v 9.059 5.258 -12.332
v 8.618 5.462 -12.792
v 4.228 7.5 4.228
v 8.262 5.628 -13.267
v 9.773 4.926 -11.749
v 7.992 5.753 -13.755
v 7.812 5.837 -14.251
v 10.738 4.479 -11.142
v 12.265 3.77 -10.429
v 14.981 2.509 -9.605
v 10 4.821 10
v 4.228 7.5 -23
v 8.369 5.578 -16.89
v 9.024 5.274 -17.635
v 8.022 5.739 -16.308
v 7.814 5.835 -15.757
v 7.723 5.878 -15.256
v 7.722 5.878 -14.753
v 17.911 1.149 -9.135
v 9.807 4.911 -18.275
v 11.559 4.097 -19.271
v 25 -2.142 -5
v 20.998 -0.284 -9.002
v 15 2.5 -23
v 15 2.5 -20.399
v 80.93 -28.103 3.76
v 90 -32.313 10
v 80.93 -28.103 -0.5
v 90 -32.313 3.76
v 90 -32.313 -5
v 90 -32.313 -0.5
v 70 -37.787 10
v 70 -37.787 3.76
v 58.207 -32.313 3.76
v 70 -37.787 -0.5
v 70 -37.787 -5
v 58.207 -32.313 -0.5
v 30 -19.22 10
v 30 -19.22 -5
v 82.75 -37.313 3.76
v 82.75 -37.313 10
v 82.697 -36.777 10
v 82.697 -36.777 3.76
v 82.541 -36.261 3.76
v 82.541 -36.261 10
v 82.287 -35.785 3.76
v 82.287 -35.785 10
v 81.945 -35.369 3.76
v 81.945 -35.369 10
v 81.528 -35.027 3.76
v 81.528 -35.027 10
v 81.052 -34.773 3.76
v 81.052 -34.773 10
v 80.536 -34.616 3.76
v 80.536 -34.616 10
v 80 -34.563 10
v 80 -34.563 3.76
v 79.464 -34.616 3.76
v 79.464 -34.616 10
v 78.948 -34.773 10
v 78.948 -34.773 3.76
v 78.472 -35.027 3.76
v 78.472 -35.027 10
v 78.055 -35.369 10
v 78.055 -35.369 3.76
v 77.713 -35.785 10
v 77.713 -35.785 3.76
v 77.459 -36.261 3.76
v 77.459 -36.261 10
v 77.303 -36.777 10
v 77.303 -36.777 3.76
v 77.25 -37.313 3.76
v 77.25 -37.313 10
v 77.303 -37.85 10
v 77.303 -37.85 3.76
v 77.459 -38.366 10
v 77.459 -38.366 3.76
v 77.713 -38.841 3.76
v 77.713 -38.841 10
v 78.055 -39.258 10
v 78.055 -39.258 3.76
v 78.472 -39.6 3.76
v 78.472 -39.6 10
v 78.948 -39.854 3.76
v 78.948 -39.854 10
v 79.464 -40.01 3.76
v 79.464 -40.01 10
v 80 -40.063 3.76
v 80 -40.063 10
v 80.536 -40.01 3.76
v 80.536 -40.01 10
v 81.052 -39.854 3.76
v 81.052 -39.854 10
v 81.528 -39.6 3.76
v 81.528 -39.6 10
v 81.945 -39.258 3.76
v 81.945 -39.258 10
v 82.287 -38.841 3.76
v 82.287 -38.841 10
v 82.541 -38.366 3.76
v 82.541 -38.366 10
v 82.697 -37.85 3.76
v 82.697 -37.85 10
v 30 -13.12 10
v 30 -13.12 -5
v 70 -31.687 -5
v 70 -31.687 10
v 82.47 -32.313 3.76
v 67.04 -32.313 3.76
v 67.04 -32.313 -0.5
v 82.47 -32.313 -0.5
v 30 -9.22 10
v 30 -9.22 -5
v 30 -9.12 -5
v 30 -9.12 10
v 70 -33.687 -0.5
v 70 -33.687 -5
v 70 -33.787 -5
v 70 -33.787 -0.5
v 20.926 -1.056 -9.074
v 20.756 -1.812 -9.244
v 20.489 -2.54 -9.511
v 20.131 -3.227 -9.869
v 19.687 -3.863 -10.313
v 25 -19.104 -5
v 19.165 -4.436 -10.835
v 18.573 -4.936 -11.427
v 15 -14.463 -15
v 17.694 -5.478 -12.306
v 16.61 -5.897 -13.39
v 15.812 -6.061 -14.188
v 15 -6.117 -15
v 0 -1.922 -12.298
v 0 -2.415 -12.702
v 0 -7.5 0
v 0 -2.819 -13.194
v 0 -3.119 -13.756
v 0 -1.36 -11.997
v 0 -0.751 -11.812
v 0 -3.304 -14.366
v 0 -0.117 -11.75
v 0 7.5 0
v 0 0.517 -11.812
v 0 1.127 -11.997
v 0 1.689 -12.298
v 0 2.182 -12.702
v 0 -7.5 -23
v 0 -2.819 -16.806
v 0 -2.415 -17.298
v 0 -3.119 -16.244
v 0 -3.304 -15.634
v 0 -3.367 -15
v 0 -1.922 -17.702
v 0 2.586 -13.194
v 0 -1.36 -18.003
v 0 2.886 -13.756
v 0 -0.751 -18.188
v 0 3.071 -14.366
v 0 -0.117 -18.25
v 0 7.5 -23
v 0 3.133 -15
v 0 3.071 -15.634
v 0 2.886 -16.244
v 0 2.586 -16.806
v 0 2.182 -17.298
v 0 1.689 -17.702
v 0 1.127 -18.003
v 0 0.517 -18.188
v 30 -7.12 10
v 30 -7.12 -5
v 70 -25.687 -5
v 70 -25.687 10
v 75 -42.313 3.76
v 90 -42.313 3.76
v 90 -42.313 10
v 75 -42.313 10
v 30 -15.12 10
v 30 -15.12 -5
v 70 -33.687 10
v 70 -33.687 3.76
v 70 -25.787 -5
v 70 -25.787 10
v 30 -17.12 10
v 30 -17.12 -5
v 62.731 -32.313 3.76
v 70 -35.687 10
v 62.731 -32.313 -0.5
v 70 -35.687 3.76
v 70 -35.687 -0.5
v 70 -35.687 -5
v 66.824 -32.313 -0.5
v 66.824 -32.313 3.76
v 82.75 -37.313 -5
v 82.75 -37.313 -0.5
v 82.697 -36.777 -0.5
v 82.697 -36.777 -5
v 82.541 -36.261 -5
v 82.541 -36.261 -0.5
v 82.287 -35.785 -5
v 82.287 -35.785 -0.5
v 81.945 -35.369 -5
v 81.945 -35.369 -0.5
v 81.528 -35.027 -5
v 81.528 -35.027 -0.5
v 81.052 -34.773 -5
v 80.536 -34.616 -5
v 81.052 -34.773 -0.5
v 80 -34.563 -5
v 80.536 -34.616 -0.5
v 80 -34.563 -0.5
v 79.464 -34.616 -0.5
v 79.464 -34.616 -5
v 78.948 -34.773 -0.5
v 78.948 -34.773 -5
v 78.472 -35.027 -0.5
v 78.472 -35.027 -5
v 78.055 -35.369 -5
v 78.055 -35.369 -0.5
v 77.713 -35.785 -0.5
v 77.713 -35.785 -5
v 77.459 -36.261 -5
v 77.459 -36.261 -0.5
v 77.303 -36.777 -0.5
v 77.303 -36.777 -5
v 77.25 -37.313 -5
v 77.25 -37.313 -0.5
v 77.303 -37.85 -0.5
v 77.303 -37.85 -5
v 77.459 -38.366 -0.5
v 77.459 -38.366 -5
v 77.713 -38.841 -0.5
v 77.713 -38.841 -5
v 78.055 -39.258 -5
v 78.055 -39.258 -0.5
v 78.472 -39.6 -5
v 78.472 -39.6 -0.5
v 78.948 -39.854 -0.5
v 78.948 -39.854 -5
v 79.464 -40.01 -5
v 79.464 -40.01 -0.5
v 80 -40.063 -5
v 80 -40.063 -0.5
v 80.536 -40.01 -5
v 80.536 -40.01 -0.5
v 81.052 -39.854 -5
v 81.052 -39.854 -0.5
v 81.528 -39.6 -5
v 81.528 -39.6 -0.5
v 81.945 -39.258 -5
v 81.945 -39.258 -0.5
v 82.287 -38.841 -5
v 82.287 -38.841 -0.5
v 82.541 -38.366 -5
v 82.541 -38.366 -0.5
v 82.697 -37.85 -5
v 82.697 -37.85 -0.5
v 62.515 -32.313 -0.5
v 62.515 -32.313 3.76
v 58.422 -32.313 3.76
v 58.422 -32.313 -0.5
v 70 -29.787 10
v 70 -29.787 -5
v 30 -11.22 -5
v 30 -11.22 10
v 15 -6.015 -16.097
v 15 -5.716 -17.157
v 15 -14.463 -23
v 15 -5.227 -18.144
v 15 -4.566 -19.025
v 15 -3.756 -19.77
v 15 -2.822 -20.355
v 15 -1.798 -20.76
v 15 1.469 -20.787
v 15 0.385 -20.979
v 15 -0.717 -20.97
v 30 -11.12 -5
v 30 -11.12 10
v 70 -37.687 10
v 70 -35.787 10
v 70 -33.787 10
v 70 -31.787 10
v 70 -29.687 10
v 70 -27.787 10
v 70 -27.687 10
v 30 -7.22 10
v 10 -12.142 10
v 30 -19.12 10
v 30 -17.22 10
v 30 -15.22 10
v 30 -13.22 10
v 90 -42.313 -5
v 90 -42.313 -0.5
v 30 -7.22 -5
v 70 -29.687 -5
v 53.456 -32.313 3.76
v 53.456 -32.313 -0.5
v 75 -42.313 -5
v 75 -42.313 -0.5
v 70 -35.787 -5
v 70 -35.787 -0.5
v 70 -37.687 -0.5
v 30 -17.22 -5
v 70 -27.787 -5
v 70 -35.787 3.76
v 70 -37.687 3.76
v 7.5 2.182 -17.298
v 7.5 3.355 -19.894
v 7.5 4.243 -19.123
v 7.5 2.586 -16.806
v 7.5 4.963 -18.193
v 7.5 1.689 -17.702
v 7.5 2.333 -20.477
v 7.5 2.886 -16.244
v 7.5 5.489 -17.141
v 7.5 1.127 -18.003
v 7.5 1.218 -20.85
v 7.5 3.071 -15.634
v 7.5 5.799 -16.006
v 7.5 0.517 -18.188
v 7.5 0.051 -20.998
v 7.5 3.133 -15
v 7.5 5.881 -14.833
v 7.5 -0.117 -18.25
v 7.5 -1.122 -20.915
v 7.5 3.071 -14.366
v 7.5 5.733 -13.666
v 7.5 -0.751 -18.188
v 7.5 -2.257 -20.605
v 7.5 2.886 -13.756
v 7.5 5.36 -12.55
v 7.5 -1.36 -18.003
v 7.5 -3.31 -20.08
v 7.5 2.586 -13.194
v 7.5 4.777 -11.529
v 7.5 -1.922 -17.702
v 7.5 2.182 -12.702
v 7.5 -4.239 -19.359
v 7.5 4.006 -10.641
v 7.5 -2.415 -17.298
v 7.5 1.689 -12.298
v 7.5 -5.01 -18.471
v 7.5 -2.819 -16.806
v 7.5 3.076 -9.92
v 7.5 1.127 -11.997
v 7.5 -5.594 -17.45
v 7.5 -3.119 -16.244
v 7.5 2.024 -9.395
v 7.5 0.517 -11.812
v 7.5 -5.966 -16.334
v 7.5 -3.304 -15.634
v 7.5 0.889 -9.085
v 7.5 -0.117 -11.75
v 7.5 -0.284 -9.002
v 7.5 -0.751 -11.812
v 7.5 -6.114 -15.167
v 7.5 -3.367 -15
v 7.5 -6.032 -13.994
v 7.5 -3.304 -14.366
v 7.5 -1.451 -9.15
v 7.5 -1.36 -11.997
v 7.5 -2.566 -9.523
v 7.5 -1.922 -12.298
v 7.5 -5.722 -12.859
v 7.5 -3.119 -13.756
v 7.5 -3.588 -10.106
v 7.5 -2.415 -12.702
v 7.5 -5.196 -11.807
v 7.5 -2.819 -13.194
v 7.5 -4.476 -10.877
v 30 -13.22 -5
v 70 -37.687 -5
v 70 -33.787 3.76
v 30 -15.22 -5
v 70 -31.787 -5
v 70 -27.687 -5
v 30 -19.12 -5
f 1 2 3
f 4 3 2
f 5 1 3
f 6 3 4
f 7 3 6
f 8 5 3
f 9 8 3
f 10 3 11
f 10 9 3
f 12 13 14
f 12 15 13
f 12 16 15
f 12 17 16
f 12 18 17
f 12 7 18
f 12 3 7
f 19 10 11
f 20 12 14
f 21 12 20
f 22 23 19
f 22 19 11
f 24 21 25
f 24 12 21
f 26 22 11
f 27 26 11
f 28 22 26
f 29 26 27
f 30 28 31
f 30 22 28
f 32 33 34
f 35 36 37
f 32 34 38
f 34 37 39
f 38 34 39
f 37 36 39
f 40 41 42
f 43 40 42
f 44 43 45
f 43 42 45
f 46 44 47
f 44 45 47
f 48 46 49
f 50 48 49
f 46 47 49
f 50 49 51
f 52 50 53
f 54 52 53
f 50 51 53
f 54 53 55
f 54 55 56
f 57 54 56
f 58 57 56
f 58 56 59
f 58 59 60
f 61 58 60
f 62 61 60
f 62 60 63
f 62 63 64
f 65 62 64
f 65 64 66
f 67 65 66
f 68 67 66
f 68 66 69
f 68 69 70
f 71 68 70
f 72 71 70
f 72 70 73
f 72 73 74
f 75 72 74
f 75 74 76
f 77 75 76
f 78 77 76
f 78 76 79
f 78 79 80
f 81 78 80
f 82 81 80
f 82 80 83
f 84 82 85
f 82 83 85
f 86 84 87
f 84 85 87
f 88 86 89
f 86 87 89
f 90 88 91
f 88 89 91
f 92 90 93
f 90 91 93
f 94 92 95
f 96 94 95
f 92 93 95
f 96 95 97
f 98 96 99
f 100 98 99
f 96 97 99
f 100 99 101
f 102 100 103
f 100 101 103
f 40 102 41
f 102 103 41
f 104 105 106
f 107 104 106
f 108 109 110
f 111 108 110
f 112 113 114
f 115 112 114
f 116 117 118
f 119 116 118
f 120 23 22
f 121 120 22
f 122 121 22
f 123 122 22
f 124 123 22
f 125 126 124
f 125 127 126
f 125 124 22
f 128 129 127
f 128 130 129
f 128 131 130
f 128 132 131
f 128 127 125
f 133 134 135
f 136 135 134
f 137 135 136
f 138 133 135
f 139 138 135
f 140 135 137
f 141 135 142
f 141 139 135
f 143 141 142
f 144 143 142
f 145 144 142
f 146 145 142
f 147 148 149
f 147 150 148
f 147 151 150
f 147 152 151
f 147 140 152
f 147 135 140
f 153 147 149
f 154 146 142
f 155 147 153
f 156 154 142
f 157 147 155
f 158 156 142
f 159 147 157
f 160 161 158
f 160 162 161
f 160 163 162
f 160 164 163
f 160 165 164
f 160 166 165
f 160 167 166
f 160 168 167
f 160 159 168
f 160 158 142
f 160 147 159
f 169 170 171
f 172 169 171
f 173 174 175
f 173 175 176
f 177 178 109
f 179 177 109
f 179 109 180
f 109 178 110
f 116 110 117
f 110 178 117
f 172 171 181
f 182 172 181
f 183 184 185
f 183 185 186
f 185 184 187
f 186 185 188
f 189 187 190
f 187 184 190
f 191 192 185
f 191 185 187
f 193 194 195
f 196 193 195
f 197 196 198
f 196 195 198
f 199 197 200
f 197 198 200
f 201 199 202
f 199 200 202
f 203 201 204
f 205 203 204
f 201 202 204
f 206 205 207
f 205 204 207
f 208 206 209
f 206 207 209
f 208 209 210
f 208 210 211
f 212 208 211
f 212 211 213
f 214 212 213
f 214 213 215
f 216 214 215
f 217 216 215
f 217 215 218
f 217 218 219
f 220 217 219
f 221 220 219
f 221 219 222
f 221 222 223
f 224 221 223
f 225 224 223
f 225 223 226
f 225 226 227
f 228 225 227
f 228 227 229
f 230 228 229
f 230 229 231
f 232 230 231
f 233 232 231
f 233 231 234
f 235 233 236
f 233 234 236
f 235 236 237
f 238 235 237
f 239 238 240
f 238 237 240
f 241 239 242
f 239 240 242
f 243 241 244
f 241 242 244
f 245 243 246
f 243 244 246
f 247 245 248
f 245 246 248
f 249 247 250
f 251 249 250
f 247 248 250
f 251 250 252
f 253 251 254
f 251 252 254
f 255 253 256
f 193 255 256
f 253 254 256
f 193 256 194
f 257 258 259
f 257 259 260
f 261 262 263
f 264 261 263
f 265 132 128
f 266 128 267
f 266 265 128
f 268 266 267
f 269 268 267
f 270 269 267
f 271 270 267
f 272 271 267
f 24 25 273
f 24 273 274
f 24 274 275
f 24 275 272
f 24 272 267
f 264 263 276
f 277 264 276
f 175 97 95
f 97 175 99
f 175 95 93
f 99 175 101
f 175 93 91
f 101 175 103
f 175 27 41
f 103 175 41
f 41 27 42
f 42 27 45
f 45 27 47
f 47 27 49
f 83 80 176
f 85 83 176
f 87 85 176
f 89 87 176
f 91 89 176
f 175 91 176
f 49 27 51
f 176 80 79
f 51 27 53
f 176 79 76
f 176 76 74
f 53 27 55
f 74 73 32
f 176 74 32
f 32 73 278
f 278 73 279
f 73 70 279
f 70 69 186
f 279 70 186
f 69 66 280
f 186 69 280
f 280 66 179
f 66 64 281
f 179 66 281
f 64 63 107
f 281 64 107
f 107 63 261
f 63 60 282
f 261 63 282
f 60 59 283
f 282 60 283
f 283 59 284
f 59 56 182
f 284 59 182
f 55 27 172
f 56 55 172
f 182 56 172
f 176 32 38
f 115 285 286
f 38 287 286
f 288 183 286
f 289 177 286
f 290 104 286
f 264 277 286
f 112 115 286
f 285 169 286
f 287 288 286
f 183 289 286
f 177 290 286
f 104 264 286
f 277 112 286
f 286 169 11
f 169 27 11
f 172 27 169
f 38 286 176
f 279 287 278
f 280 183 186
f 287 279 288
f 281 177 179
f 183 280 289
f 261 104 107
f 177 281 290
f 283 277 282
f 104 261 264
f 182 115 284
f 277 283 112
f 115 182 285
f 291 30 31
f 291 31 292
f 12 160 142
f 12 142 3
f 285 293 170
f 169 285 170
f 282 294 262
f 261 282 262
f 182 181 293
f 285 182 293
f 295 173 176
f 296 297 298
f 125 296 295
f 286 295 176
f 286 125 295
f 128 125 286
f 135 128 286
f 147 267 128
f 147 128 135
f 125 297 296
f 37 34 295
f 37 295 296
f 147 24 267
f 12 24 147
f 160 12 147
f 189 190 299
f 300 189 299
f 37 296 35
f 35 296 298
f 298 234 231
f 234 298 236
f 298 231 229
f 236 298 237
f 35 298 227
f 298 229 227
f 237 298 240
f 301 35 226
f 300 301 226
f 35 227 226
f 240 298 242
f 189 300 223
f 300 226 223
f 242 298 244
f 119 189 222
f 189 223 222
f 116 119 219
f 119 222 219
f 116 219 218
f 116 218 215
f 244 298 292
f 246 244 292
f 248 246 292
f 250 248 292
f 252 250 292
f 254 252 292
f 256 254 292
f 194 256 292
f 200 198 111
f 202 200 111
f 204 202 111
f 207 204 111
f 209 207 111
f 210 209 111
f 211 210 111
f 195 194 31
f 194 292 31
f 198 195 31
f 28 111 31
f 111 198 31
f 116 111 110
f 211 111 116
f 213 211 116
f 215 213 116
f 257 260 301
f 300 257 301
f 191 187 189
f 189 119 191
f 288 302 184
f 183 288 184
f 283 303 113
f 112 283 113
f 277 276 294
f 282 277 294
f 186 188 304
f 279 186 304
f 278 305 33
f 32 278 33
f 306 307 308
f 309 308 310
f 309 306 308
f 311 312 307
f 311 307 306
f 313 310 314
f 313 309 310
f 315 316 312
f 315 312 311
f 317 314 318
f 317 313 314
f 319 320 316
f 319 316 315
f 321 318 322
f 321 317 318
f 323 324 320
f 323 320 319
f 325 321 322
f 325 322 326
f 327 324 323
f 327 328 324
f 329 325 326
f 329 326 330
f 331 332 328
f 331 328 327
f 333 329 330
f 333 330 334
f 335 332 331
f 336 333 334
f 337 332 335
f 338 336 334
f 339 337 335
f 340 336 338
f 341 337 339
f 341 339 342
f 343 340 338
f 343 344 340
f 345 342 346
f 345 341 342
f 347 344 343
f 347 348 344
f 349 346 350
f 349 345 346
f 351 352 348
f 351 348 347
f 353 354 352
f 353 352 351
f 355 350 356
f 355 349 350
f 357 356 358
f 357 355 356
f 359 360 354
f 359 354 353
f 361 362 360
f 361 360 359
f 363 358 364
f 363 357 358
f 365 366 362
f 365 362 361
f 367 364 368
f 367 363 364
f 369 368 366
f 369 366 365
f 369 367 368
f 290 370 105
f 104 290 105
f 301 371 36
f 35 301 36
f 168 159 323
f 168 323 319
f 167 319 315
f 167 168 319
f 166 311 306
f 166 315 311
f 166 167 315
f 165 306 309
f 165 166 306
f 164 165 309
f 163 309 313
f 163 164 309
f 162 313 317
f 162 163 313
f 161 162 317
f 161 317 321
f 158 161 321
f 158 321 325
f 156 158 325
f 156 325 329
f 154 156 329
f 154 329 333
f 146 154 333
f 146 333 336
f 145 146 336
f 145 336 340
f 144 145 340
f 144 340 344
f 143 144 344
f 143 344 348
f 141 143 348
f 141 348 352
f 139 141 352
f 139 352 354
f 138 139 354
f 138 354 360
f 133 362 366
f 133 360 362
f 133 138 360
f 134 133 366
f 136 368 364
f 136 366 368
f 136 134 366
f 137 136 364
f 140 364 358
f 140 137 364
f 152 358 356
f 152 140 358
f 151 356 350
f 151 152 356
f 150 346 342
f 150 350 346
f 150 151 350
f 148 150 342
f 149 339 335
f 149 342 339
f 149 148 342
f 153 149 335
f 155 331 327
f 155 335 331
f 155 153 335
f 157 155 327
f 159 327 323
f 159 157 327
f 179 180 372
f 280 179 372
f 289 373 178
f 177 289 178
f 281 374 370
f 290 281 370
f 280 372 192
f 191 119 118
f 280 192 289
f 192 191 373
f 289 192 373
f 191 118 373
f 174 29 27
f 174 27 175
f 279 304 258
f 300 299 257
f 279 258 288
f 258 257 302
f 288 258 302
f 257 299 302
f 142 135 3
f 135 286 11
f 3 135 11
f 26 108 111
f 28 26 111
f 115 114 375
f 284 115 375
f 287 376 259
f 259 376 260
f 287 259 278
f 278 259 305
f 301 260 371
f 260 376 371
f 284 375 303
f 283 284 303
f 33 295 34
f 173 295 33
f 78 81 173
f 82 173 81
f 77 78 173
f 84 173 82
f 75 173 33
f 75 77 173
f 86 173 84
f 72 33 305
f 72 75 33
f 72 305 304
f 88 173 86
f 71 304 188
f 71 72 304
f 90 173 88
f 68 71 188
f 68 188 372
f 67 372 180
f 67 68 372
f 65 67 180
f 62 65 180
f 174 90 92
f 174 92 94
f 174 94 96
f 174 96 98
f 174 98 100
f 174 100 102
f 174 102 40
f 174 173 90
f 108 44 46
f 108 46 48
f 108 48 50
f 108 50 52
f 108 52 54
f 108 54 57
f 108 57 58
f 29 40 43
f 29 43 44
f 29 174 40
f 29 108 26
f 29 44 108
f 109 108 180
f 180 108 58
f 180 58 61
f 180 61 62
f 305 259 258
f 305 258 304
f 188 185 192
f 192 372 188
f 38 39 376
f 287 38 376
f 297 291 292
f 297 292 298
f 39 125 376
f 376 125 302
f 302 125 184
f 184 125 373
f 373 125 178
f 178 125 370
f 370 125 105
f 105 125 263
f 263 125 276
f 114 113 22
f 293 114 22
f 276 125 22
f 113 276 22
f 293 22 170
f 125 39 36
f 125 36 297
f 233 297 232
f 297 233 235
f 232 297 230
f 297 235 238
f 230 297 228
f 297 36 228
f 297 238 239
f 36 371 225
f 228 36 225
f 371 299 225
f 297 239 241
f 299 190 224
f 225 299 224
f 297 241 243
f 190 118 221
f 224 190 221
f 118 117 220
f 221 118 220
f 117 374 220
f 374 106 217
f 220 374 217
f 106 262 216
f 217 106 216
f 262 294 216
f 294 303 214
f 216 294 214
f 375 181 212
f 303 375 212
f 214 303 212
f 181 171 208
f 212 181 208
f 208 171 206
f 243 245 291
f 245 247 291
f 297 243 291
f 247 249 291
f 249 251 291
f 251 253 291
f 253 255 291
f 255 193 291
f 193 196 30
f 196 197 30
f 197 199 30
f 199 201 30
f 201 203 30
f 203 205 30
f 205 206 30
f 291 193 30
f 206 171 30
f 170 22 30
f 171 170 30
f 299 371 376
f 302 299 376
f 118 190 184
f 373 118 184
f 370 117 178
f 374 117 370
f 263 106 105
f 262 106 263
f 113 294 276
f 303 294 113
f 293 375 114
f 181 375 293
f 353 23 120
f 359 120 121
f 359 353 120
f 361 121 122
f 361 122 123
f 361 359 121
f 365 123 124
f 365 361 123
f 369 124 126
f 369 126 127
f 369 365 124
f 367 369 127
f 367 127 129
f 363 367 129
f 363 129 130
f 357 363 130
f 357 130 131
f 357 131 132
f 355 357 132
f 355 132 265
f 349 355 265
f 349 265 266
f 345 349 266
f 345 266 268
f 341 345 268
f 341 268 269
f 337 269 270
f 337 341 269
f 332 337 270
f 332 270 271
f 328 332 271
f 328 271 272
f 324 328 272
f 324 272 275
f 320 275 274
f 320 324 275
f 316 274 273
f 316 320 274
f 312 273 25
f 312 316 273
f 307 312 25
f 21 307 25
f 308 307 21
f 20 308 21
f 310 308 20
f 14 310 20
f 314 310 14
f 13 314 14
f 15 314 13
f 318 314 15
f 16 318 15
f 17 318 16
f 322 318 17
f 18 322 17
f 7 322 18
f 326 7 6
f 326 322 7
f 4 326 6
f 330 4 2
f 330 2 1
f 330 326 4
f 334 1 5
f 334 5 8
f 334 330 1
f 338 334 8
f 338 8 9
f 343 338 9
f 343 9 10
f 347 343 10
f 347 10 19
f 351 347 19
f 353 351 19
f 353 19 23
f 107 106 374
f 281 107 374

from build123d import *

# Parameters (mm, degrees)
BOSS_EXTRUDE1_DEPTH      = 10
BOSS_EXTRUDE1_DEPTH_BACK = 23
SKETCH2_W                = 75
SKETCH2_H                = 18
CUT_EXTRUDE1_DEPTH       = 106.405673062
SKETCH3_W                = 4.26
SKETCH3_H                = 10
CUT_EXTRUDE2_DEPTH       = 103.075500294
CHAMFER1_SIZE            = 10
SKETCH4_R                = 2.75
CUT_EXTRUDE3_DEPTH       = 105.782669179
CUT_EXTRUDE4_DEPTH       = 90.13140726
CUT_EXTRUDE4_DEPTH_BACK  = 90.13140726
SKETCH5_R                = 3.25
SKETCH6_R                = 6
CUT_EXTRUDE5_DEPTH       = 96.528308685
CHAMFER2_SIZE            = 10
CHAMFER2_SIZE2           = 7.529686928
CUT_EXTRUDE6_DEPTH       = 102.066353255


with BuildPart() as part:
    # Sketch1 → Boss-Extrude1 (new, two sides: drawn at the far end of the back side and taken through both)
    with BuildSketch(Plane.XY.offset(-BOSS_EXTRUDE1_DEPTH_BACK)):
        Polygon((0, -7.5), (0, 7.5), (4.228226943, 7.5), (90, -32.313210233), (90, -42.313210233), (75, -42.313210233), align=None)
    extrude(amount=BOSS_EXTRUDE1_DEPTH + BOSS_EXTRUDE1_DEPTH_BACK)

    # Sketch2 → Cut-Extrude1 (cut, through all)
    with BuildSketch(Plane(origin=(0, 7.5, 0), x_dir=(1, 0, 0), z_dir=(0, 1, 0))):
        with Locations((52.5, 14)):
            Rectangle(SKETCH2_W, SKETCH2_H)
    extrude(amount=-CUT_EXTRUDE1_DEPTH, mode=Mode.SUBTRACT)

    # Sketch3 → Cut-Extrude2 (cut, through all)
    with BuildSketch(Plane(origin=(90, 0, 0), x_dir=(0, 0, -1), z_dir=(1, 0, 0))):
        with Locations((-1.63, -37.313210233)):
            Rectangle(SKETCH3_W, SKETCH3_H)
    extrude(amount=-CUT_EXTRUDE2_DEPTH, mode=Mode.SUBTRACT)

    # Chamfer1
    chamfer1_edges = [part.edges().sort_by_distance(p)[0] for p in [
        (15, -5.981321023, -5),
        (0, 0, 10),
    ]]
    chamfer(chamfer1_edges, length=CHAMFER1_SIZE)

    # Sketch4 → Cut-Extrude3 (cut, through all)
    with BuildSketch(Plane.XY.offset(10)):
        with Locations((80, -37.313210233)):
            Circle(SKETCH4_R)
    extrude(amount=-CUT_EXTRUDE3_DEPTH, mode=Mode.SUBTRACT)

    # Sketch5 → Cut-Extrude4 (cut, two sides: drawn at the far end of the back side and taken through both)
    with BuildSketch(Plane(origin=(15, 0, 0), x_dir=(0, 0, -1), z_dir=(1, 0, 0)).offset(-CUT_EXTRUDE4_DEPTH_BACK)):
        with Locations((15, -0.11657101)):
            Circle(SKETCH5_R)
    extrude(amount=CUT_EXTRUDE4_DEPTH + CUT_EXTRUDE4_DEPTH_BACK, mode=Mode.SUBTRACT)

    # Sketch6 → Cut-Extrude5 (cut, through all)
    with BuildSketch(Plane(origin=(7.5, 0, 0), x_dir=(0, 0, -1), z_dir=(1, 0, 0))):
        with Locations(Location((15, -0.11657101, 0), (0, 0, 181.598775169))):
            Circle(SKETCH6_R)
    extrude(amount=CUT_EXTRUDE5_DEPTH, mode=Mode.SUBTRACT)

    # Chamfer2
    chamfer2_edges = [part.edges().sort_by_distance(p)[0] for p in [
        (90, -32.313210233, 1.63),
    ]]
    chamfer2_side = [part.faces().sort_by_distance(p)[0] for p in [
        (43.268675536, -10.621644592, 0.683427775),
    ]]
    chamfer(chamfer2_edges, length=CHAMFER2_SIZE, length2=CHAMFER2_SIZE2, reference=chamfer2_side[0])

    # Sketch7 → Cut-Extrude6 (cut, through all)
    with BuildSketch(Plane(origin=(0, 0, -5), x_dir=(-1, 0, 0), z_dir=(0, 0, -1))):
        Polygon((-30, -19.12032651), (-70, -37.687371968), (-70, -37.787371968), (-30, -19.22032651), align=None)
        Polygon((-30, -17.12032651), (-70, -35.687371968), (-70, -35.787371968), (-30, -17.22032651), align=None)
        Polygon((-30, -15.12032651), (-70, -33.687371968), (-70, -33.787371968), (-30, -15.22032651), align=None)
        Polygon((-30, -13.12032651), (-70, -31.687371968), (-70, -31.787371968), (-30, -13.22032651), align=None)
        Polygon((-30, -11.12032651), (-70, -29.687371968), (-70, -29.787371968), (-30, -11.22032651), align=None)
        Polygon((-30, -9.12032651), (-70, -27.687371968), (-70, -27.787371968), (-30, -9.22032651), align=None)
        Polygon((-30, -7.12032651), (-70, -25.687371968), (-70, -25.787371968), (-30, -7.22032651), align=None)
    extrude(amount=-CUT_EXTRUDE6_DEPTH, mode=Mode.SUBTRACT)


solid = part.part
